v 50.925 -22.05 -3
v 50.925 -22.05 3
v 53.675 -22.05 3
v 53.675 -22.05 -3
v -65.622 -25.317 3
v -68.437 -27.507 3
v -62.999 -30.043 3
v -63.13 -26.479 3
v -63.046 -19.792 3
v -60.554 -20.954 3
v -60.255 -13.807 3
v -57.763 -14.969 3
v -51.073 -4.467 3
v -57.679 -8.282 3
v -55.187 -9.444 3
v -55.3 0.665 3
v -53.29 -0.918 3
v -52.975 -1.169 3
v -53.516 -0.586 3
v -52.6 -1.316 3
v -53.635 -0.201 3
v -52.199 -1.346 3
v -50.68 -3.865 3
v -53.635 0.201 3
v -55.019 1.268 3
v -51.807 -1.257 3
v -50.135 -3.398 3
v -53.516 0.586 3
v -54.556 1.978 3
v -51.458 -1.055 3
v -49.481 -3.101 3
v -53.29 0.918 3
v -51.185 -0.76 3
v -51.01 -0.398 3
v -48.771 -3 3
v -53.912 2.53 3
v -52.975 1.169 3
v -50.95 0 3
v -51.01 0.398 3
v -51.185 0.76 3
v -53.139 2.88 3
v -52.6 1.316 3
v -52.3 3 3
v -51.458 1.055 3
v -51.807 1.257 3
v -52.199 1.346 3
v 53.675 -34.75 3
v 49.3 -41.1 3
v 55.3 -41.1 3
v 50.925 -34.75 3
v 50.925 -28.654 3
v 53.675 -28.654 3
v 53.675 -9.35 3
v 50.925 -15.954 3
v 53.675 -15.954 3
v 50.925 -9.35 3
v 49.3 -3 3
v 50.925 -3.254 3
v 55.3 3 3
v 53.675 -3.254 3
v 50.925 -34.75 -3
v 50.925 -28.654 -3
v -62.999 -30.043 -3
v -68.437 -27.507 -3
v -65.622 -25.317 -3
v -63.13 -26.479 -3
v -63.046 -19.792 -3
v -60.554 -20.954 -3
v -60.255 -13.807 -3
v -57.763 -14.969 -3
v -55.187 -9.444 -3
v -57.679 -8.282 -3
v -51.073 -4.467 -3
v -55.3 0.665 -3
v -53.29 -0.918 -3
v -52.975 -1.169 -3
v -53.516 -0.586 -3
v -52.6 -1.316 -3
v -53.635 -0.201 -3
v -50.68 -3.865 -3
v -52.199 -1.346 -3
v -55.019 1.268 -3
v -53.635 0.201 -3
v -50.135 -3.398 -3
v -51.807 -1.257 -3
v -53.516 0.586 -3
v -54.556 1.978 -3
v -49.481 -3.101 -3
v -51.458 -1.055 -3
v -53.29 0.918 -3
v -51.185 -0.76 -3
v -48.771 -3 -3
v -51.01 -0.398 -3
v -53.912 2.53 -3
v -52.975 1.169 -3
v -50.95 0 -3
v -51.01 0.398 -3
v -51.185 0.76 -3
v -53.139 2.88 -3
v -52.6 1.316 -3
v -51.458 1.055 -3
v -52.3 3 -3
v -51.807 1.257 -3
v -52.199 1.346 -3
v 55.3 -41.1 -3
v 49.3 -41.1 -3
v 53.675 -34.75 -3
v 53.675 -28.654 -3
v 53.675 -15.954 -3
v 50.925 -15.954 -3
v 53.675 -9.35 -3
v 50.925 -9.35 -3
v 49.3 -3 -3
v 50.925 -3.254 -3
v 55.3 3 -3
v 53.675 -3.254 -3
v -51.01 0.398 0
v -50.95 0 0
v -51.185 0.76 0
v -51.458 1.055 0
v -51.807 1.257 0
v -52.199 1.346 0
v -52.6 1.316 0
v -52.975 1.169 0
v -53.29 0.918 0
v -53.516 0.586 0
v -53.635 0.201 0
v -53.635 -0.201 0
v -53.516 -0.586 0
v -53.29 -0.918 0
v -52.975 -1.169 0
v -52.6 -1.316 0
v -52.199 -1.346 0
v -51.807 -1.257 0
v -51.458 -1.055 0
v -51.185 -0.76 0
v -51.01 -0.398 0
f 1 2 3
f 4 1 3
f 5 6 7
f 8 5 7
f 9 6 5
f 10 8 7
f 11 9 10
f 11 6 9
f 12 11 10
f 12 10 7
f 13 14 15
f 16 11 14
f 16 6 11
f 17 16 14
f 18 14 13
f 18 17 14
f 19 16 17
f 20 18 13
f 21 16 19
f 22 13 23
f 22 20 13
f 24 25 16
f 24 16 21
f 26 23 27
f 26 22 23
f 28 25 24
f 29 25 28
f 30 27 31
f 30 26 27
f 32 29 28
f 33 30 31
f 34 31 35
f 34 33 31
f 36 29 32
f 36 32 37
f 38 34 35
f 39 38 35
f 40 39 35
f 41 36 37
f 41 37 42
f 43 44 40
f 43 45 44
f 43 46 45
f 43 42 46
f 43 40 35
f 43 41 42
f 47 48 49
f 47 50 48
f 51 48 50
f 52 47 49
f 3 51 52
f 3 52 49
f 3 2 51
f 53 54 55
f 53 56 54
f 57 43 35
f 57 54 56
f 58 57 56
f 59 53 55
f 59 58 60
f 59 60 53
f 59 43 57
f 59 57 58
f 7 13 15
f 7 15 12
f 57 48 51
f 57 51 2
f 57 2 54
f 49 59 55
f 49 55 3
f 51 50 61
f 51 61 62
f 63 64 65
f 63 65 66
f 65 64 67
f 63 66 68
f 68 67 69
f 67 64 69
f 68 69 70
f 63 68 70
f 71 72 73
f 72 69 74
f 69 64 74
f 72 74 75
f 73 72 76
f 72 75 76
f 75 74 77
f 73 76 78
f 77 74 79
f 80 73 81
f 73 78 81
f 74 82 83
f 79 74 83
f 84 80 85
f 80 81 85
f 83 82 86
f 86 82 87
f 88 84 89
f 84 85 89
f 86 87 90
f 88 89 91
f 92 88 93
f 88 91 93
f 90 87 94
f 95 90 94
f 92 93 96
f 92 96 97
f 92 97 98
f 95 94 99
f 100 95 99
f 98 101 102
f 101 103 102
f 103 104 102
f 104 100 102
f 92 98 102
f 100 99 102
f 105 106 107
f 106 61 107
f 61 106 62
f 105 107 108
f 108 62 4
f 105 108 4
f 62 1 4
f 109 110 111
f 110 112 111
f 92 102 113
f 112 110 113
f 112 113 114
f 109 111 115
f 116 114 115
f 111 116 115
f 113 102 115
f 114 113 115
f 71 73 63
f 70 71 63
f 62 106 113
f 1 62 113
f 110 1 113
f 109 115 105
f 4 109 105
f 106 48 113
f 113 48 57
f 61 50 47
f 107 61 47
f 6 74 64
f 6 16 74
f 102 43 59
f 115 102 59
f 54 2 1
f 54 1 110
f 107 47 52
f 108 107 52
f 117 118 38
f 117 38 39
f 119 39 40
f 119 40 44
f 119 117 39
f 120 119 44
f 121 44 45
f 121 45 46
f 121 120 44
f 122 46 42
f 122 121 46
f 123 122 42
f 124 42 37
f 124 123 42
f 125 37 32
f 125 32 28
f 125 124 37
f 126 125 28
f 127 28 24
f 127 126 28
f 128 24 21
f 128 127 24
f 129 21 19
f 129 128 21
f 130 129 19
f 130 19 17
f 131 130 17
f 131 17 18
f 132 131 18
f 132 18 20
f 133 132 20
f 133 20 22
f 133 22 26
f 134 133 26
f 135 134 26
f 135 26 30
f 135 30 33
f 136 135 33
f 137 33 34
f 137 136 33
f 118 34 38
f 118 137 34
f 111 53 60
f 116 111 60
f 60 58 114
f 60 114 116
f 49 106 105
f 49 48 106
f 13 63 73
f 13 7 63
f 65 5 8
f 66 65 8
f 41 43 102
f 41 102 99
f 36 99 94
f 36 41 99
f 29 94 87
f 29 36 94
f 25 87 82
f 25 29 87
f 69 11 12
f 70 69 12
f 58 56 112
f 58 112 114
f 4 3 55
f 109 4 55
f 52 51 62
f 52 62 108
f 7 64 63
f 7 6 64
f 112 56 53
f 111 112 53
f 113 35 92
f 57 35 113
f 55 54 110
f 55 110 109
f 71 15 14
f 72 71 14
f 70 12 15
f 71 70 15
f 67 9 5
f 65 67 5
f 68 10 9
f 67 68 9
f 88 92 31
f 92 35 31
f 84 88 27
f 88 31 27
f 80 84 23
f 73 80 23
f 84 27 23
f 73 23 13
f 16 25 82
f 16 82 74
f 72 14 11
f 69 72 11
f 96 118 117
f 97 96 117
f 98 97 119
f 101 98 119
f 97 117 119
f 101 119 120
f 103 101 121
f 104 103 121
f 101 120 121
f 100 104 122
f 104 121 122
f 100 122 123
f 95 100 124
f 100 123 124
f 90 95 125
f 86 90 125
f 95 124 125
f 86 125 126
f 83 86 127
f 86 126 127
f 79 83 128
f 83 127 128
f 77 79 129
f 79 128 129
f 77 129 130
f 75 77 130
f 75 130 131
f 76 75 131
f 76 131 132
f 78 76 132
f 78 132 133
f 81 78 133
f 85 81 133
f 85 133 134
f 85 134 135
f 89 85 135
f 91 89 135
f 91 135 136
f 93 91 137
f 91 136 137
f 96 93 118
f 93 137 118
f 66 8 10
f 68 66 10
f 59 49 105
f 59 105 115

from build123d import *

# Parameters (mm, degrees)
SKETCH1_R           = 1.35
SKETCH1_W           = 6
SKETCH1_H           = 38.1
SKETCH1_H_2         = 6
BOSS_EXTRUDE1_DEPTH = 3
FILLET1_R           = 2.54
CUT_EXTRUDE1_DEPTH  = 81.055232476
LPATTERN1_COUNT     = 2
LPATTERN1_PITCH     = 12.7
SKETCH3_W           = 2.75
SKETCH3_H           = 6.096
CUT_EXTRUDE2_DEPTH  = 81.055232476
LPATTERN2_COUNT     = 3
LPATTERN2_PITCH     = 12.7


with BuildPart() as part:
    # Sketch1 → Boss-Extrude1 (new, symmetric)
    # profile 1 of 3: a face of its own
    with BuildSketch(Plane.XY):
        with BuildLine():
            Line((-62.999206449, -30.043127024), (-50.388789218, -3))
            Line((-50.388789218, -3), (49.3, -3))
            Line((49.3, -3), (49.3, 3))
            Line((49.3, 3), (-52.3, 3))
            ThreePointArc((-52.3, 3), (-53.911898825, 2.530174337), (-55.018923361, 1.267854785))
            Line((-55.018923361, 1.267854785), (-55.3, 0.665083988))
            Line((-55.3, 0.665083988), (-68.437053171, -27.507417453))
            Line((-68.437053171, -27.507417453), (-62.999206449, -30.043127024))
        make_face()
        with Locations((-52.3, 0)):
            Circle(SKETCH1_R, mode=Mode.SUBTRACT)
    # profile 2 of 3: a face of its own
    with BuildSketch(Plane.XY):
        with Locations((52.3, -22.05)):
            Rectangle(SKETCH1_W, SKETCH1_H)
    # profile 3 of 3: a face of its own
    with BuildSketch(Plane.XY):
        with Locations((52.3, 0)):
            Rectangle(SKETCH1_W, SKETCH1_H_2)
    extrude(amount=BOSS_EXTRUDE1_DEPTH, both=True)

    # Fillet1
    fillet1_edges = [part.edges().sort_by_distance(p)[0] for p in [
        (-50.388789218, -3, 0),
    ]]
    fillet(fillet1_edges, radius=FILLET1_R)

    # Sketch2 → Cut-Extrude1 (cut, symmetric)
    with BuildSketch(Plane.XY.offset(3)):
        Polygon((-63.046209113, -19.791792635), (-65.622490036, -25.316644905), (-63.130143622, -26.478845124), (-60.553862698, -20.953992855), align=None)
    cut_extrude1 = extrude(amount=CUT_EXTRUDE1_DEPTH, both=True, mode=Mode.SUBTRACT)

    # LPattern1: Cut-Extrude1 ×2
    with Locations(*[Vector(0.42261826174070405, 0.9063077870366479, 0) * (i * LPATTERN1_PITCH) for i in range(1, LPATTERN1_COUNT)]):
        add(cut_extrude1, mode=Mode.SUBTRACT)

    # Sketch3 → Cut-Extrude2 (cut, symmetric)
    with BuildSketch(Plane.XY.offset(3)):
        with Locations((52.3, -31.702)):
            Rectangle(SKETCH3_W, SKETCH3_H)
    cut_extrude2 = extrude(amount=CUT_EXTRUDE2_DEPTH, both=True, mode=Mode.SUBTRACT)

    # LPattern2: Cut-Extrude2 ×3
    with Locations(*[(0, i * LPATTERN2_PITCH, 0) for i in range(1, LPATTERN2_COUNT)]):
        add(cut_extrude2, mode=Mode.SUBTRACT)


solid = part.part
